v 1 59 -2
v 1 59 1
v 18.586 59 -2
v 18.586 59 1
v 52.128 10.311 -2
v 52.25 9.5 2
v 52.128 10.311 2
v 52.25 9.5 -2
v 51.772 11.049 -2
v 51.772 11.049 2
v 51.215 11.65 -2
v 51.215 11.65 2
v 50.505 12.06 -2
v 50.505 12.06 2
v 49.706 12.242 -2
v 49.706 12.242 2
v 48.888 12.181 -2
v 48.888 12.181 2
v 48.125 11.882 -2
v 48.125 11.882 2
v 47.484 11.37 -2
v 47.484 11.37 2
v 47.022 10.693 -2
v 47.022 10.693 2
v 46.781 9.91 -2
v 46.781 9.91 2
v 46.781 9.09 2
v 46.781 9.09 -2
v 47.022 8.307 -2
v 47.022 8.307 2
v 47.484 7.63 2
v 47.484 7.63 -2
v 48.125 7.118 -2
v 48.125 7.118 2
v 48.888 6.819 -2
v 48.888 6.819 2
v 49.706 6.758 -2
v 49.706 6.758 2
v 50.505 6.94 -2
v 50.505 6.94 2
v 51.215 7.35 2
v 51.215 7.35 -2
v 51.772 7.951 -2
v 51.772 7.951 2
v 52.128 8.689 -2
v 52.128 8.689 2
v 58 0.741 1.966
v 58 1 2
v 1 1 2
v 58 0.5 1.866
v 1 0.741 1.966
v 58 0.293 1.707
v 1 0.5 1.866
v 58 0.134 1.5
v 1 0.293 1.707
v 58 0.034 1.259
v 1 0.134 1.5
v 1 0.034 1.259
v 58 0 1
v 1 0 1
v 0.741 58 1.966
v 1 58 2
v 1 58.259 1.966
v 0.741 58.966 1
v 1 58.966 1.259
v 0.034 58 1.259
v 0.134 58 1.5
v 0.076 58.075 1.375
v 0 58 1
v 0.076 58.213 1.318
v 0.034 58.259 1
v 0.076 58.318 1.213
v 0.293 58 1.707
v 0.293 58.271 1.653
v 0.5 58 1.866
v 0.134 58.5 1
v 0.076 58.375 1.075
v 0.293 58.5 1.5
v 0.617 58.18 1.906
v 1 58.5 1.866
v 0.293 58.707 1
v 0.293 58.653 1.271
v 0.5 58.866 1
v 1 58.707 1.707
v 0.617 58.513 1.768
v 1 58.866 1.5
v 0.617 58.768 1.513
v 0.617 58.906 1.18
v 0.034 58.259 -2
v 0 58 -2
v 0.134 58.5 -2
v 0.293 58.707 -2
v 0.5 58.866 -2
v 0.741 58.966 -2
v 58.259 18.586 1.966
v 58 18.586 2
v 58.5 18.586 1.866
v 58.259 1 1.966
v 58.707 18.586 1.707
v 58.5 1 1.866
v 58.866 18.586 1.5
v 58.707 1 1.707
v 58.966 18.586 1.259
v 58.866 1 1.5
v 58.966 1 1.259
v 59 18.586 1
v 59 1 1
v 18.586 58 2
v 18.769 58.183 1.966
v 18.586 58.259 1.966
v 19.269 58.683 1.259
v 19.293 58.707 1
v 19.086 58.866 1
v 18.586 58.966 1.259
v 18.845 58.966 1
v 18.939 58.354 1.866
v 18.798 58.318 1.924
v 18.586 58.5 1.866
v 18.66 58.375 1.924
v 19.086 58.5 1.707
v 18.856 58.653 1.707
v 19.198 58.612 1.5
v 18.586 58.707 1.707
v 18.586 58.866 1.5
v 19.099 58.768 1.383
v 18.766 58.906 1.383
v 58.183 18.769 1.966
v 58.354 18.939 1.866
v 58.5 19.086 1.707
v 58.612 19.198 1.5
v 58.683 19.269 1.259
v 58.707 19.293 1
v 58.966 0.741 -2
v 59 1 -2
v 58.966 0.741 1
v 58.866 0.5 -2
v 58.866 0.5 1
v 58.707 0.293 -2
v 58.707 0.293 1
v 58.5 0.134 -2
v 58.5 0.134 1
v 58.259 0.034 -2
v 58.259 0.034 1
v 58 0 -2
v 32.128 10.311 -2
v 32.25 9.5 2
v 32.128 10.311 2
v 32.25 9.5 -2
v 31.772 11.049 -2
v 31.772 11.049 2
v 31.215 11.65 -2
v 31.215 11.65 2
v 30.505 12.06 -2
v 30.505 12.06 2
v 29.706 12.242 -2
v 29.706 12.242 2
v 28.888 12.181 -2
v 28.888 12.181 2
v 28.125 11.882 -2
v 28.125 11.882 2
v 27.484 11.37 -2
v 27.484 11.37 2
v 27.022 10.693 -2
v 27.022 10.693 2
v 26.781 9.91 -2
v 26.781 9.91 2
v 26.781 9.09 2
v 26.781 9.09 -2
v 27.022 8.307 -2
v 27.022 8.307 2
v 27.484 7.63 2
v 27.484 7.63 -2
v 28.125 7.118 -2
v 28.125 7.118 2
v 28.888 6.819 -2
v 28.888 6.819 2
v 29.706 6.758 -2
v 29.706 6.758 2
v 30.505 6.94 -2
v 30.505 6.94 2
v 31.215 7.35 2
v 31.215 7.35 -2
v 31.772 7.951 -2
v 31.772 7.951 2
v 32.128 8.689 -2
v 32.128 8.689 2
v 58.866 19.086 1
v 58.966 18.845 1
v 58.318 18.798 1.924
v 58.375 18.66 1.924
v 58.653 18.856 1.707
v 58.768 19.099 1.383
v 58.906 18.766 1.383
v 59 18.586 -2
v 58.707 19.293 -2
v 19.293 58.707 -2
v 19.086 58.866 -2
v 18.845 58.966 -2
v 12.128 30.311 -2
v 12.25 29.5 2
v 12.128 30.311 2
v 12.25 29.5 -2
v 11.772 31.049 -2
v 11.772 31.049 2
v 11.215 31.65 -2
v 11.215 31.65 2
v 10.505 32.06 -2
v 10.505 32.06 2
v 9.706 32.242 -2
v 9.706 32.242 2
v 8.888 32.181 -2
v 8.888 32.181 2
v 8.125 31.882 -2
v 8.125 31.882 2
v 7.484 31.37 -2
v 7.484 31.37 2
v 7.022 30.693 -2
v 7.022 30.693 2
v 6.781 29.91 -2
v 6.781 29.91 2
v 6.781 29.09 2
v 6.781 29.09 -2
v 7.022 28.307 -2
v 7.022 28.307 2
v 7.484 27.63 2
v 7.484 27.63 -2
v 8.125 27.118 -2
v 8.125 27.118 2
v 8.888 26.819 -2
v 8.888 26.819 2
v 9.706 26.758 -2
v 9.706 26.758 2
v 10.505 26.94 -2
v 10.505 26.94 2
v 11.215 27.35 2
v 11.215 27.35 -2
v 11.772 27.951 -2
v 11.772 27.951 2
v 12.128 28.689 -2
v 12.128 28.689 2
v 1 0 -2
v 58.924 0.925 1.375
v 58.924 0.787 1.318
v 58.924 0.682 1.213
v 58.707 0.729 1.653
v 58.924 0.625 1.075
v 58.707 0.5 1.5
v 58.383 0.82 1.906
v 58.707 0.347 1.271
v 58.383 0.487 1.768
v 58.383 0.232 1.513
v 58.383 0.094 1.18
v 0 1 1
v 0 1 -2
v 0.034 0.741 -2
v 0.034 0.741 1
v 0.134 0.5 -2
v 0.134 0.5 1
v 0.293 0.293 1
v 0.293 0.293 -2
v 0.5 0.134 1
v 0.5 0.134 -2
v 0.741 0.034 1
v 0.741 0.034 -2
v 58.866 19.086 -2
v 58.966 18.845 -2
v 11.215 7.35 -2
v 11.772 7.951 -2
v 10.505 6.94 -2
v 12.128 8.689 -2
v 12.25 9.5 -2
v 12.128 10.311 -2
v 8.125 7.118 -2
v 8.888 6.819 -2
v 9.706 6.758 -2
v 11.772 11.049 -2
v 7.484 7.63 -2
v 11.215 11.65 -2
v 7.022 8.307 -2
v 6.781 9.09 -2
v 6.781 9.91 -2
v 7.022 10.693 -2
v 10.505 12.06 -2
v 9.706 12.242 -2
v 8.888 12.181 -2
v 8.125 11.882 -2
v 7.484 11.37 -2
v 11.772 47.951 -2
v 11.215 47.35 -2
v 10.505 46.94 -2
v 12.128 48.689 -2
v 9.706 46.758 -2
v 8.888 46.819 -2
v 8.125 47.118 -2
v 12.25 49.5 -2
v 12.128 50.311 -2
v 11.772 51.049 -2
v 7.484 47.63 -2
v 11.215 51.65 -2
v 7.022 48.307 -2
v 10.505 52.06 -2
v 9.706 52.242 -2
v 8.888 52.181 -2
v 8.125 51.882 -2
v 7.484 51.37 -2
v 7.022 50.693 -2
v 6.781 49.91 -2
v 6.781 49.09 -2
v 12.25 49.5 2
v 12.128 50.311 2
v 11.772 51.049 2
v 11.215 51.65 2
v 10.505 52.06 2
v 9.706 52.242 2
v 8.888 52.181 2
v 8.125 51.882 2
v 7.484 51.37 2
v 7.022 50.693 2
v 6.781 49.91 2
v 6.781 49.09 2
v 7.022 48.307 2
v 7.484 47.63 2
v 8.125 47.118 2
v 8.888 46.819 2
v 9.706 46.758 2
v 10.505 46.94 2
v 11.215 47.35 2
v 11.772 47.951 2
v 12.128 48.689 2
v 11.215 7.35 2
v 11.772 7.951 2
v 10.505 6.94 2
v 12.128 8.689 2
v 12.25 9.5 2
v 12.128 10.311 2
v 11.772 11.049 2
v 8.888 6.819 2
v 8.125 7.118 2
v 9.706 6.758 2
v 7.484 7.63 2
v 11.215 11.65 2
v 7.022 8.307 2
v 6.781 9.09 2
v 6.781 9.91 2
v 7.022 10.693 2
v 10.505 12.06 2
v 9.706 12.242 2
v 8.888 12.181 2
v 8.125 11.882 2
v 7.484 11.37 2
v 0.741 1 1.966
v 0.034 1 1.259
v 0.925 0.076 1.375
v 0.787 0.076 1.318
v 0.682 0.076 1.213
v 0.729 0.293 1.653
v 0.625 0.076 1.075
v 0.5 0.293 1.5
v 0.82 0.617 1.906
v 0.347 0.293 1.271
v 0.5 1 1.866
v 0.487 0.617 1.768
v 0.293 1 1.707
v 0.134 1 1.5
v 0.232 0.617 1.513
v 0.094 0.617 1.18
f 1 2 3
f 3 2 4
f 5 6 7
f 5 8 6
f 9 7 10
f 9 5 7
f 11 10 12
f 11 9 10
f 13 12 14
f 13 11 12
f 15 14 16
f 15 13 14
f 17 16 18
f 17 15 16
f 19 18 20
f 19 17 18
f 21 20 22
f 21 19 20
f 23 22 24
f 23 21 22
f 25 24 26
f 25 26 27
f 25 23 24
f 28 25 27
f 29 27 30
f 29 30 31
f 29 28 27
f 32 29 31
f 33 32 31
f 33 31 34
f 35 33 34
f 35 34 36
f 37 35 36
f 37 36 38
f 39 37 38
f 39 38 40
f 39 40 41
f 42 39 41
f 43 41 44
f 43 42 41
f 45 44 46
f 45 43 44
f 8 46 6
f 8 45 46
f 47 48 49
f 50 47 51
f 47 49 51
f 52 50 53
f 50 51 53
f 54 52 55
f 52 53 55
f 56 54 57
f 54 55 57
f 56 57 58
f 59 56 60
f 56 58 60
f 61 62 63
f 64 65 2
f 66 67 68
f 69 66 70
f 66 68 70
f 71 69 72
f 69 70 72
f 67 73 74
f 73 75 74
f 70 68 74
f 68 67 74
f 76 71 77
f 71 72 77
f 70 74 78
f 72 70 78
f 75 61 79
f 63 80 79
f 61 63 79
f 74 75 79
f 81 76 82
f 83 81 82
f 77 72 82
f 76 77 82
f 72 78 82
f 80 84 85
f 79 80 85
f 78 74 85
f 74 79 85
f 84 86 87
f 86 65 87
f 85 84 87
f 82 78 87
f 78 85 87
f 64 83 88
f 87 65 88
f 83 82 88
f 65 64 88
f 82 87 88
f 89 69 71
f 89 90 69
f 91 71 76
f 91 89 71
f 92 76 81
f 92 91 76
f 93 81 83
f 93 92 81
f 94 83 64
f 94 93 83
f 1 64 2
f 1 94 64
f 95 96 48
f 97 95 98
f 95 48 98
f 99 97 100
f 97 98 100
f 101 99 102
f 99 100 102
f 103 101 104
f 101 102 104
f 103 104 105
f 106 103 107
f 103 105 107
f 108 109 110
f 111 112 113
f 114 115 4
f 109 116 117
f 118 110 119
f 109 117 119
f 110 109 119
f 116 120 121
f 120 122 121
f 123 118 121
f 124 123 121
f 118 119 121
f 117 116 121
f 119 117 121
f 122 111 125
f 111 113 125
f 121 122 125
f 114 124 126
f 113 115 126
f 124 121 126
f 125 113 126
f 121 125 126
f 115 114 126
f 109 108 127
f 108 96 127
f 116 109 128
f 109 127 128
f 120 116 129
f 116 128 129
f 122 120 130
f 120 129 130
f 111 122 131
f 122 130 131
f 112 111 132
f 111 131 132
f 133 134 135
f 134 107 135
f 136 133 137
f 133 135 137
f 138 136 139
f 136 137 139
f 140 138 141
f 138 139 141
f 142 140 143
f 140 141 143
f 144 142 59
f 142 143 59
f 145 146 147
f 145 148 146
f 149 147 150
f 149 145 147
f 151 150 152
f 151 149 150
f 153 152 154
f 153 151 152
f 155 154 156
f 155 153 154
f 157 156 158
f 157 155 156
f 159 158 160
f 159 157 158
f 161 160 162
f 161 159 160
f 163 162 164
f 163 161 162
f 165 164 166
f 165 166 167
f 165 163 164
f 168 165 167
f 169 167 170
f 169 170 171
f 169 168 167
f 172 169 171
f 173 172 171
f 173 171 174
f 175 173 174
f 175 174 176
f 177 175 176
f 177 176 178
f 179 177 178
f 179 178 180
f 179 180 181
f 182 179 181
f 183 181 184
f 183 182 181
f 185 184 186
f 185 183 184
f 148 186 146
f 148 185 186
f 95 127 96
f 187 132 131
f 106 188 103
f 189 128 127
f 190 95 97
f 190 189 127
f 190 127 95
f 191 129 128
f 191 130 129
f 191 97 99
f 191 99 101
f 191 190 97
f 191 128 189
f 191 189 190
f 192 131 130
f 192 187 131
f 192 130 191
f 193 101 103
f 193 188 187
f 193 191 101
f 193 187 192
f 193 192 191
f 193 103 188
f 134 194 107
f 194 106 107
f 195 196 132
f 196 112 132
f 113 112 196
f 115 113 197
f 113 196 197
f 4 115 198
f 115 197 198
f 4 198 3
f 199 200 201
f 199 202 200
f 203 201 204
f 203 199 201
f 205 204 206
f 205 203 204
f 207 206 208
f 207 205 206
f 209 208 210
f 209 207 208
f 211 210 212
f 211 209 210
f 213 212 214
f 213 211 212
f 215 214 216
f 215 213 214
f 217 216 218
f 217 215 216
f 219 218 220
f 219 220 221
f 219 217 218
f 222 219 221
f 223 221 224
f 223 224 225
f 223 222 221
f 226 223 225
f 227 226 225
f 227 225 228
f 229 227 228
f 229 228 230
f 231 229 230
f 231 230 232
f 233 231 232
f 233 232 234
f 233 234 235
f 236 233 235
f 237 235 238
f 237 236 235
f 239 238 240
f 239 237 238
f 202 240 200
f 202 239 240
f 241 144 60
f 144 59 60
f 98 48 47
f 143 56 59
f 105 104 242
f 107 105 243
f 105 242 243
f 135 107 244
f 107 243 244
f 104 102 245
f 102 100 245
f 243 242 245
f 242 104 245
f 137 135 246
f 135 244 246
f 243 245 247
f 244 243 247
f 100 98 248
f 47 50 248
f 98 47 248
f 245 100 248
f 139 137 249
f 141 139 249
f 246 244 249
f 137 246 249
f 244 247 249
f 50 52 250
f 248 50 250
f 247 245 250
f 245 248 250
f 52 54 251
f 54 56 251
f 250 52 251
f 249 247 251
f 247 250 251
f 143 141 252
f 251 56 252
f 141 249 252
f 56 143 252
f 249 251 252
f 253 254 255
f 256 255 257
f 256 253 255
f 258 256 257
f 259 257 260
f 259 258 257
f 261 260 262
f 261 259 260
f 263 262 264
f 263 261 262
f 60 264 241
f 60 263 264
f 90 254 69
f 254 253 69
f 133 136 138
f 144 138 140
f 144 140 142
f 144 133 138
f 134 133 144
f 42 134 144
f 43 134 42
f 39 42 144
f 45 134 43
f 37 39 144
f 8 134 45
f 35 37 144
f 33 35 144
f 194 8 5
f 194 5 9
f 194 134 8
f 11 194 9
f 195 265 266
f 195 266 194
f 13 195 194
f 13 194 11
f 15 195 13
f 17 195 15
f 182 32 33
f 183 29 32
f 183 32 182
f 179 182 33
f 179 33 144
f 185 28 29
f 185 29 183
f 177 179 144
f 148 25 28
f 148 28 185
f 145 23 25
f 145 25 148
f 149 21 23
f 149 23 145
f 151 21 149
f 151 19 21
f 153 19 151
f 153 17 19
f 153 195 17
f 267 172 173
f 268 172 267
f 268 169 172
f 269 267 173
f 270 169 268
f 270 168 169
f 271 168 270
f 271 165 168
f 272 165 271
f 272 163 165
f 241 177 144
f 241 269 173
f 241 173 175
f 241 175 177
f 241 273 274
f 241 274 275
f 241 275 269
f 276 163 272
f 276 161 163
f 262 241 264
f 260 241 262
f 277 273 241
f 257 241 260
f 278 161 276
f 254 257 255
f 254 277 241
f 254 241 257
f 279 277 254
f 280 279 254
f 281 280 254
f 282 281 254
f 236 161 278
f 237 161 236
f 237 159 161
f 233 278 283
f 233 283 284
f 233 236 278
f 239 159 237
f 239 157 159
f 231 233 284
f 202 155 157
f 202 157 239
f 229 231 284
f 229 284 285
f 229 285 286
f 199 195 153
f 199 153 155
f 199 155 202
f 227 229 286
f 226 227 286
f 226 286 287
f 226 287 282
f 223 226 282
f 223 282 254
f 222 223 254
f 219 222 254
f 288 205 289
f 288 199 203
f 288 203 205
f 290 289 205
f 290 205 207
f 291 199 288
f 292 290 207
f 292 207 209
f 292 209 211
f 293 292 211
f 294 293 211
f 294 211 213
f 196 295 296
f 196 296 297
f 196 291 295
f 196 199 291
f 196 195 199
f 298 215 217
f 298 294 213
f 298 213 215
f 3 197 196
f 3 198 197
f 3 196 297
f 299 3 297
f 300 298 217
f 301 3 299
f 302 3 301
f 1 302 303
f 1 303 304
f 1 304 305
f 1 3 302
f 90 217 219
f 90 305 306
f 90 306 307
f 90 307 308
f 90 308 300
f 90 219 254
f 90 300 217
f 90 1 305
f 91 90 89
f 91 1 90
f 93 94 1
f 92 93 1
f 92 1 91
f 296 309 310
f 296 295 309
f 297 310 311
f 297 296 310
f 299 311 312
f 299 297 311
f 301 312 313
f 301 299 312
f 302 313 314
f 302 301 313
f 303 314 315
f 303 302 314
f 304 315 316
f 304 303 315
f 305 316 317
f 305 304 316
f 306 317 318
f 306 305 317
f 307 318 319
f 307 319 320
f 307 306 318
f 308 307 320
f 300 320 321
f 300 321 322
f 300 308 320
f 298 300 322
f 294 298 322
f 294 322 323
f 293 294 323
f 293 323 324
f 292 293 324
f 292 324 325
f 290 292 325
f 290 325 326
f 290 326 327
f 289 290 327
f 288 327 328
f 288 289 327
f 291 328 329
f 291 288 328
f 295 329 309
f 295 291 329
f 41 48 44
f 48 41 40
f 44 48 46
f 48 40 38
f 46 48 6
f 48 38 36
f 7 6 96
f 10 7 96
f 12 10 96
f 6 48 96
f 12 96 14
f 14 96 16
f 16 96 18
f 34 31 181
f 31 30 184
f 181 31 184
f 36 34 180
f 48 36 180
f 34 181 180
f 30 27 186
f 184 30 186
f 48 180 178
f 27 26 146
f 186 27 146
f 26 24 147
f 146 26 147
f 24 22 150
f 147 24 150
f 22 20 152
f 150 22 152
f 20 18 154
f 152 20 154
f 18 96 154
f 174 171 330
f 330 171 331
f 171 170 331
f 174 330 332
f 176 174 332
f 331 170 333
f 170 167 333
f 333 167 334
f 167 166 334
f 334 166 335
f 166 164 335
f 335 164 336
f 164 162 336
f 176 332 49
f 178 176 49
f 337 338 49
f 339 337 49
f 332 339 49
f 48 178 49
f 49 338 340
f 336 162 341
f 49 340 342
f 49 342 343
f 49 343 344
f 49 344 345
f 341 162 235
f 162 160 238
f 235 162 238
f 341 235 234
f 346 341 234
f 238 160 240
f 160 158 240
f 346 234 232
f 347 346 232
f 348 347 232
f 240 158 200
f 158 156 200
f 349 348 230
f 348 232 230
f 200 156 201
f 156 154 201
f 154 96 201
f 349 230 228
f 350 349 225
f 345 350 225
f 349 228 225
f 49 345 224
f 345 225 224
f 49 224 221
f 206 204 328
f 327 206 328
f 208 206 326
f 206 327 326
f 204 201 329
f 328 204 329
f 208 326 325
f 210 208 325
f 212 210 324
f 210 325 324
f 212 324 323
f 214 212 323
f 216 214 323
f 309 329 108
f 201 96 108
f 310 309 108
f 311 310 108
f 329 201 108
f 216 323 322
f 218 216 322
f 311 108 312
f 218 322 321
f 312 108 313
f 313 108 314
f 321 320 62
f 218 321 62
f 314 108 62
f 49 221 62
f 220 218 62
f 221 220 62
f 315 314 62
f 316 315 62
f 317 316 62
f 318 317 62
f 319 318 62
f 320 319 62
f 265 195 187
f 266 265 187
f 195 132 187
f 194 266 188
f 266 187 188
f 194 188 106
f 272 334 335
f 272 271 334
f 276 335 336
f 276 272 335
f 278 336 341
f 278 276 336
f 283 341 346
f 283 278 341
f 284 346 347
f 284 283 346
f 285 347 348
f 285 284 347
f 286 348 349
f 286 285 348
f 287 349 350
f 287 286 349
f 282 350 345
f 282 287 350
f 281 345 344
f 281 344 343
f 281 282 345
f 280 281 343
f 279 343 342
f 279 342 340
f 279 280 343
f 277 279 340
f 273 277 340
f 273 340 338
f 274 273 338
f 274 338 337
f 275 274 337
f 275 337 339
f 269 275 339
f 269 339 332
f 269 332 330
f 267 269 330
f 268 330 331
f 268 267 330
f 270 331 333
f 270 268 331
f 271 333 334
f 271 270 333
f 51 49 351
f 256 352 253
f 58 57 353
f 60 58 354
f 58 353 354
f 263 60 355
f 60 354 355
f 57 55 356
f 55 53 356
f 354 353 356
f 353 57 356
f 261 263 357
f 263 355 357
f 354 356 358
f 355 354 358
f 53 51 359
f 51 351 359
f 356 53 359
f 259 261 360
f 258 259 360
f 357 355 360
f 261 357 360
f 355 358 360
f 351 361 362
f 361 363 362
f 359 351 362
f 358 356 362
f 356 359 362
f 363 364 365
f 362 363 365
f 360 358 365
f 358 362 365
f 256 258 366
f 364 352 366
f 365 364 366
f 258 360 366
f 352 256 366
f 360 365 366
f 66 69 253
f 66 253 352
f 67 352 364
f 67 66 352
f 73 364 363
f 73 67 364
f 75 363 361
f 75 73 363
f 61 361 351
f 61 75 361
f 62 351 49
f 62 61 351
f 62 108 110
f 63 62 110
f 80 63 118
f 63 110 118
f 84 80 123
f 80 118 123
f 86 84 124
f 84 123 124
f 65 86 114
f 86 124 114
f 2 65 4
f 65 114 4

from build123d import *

# Parameters (mm, degrees)
SKETCH1_R           = 2.75
BOSS_EXTRUDE1_DEPTH = 2
FILLET1_R           = 1


with BuildPart() as part:
    # Sketch1 → Boss-Extrude1 (new body, symmetric)
    with BuildSketch(Plane.XY):
        Polygon((0, 0), (0, 59), (19, 59), (59, 19), (59, 0), align=None)
        with Locations((9.5, 9.5)):
            Circle(SKETCH1_R, mode=Mode.SUBTRACT)
        with Locations((29.5, 9.5)):
            Circle(SKETCH1_R, mode=Mode.SUBTRACT)
        with Locations((49.5, 9.5)):
            Circle(SKETCH1_R, mode=Mode.SUBTRACT)
        with Locations((9.5, 29.5)):
            Circle(SKETCH1_R, mode=Mode.SUBTRACT)
        with Locations((9.5, 49.5)):
            Circle(SKETCH1_R, mode=Mode.SUBTRACT)
    extrude(amount=BOSS_EXTRUDE1_DEPTH, both=True)

    # Fillet1
    fillet1_edges = [part.edges().sort_by_distance(p)[0] for p in [
        (39, 39, 2),
        (9.5, 59, 2),
        (0, 29.5, 2),
        (29.5, 0, 2),
        (59, 9.5, 2),
        (0, 0, 0),
        (0, 59, 0),
        (19, 59, 0),
        (59, 19, 0),
        (59, 0, 0),
    ]]
    fillet(fillet1_edges, radius=FILLET1_R)


solid = part.part
